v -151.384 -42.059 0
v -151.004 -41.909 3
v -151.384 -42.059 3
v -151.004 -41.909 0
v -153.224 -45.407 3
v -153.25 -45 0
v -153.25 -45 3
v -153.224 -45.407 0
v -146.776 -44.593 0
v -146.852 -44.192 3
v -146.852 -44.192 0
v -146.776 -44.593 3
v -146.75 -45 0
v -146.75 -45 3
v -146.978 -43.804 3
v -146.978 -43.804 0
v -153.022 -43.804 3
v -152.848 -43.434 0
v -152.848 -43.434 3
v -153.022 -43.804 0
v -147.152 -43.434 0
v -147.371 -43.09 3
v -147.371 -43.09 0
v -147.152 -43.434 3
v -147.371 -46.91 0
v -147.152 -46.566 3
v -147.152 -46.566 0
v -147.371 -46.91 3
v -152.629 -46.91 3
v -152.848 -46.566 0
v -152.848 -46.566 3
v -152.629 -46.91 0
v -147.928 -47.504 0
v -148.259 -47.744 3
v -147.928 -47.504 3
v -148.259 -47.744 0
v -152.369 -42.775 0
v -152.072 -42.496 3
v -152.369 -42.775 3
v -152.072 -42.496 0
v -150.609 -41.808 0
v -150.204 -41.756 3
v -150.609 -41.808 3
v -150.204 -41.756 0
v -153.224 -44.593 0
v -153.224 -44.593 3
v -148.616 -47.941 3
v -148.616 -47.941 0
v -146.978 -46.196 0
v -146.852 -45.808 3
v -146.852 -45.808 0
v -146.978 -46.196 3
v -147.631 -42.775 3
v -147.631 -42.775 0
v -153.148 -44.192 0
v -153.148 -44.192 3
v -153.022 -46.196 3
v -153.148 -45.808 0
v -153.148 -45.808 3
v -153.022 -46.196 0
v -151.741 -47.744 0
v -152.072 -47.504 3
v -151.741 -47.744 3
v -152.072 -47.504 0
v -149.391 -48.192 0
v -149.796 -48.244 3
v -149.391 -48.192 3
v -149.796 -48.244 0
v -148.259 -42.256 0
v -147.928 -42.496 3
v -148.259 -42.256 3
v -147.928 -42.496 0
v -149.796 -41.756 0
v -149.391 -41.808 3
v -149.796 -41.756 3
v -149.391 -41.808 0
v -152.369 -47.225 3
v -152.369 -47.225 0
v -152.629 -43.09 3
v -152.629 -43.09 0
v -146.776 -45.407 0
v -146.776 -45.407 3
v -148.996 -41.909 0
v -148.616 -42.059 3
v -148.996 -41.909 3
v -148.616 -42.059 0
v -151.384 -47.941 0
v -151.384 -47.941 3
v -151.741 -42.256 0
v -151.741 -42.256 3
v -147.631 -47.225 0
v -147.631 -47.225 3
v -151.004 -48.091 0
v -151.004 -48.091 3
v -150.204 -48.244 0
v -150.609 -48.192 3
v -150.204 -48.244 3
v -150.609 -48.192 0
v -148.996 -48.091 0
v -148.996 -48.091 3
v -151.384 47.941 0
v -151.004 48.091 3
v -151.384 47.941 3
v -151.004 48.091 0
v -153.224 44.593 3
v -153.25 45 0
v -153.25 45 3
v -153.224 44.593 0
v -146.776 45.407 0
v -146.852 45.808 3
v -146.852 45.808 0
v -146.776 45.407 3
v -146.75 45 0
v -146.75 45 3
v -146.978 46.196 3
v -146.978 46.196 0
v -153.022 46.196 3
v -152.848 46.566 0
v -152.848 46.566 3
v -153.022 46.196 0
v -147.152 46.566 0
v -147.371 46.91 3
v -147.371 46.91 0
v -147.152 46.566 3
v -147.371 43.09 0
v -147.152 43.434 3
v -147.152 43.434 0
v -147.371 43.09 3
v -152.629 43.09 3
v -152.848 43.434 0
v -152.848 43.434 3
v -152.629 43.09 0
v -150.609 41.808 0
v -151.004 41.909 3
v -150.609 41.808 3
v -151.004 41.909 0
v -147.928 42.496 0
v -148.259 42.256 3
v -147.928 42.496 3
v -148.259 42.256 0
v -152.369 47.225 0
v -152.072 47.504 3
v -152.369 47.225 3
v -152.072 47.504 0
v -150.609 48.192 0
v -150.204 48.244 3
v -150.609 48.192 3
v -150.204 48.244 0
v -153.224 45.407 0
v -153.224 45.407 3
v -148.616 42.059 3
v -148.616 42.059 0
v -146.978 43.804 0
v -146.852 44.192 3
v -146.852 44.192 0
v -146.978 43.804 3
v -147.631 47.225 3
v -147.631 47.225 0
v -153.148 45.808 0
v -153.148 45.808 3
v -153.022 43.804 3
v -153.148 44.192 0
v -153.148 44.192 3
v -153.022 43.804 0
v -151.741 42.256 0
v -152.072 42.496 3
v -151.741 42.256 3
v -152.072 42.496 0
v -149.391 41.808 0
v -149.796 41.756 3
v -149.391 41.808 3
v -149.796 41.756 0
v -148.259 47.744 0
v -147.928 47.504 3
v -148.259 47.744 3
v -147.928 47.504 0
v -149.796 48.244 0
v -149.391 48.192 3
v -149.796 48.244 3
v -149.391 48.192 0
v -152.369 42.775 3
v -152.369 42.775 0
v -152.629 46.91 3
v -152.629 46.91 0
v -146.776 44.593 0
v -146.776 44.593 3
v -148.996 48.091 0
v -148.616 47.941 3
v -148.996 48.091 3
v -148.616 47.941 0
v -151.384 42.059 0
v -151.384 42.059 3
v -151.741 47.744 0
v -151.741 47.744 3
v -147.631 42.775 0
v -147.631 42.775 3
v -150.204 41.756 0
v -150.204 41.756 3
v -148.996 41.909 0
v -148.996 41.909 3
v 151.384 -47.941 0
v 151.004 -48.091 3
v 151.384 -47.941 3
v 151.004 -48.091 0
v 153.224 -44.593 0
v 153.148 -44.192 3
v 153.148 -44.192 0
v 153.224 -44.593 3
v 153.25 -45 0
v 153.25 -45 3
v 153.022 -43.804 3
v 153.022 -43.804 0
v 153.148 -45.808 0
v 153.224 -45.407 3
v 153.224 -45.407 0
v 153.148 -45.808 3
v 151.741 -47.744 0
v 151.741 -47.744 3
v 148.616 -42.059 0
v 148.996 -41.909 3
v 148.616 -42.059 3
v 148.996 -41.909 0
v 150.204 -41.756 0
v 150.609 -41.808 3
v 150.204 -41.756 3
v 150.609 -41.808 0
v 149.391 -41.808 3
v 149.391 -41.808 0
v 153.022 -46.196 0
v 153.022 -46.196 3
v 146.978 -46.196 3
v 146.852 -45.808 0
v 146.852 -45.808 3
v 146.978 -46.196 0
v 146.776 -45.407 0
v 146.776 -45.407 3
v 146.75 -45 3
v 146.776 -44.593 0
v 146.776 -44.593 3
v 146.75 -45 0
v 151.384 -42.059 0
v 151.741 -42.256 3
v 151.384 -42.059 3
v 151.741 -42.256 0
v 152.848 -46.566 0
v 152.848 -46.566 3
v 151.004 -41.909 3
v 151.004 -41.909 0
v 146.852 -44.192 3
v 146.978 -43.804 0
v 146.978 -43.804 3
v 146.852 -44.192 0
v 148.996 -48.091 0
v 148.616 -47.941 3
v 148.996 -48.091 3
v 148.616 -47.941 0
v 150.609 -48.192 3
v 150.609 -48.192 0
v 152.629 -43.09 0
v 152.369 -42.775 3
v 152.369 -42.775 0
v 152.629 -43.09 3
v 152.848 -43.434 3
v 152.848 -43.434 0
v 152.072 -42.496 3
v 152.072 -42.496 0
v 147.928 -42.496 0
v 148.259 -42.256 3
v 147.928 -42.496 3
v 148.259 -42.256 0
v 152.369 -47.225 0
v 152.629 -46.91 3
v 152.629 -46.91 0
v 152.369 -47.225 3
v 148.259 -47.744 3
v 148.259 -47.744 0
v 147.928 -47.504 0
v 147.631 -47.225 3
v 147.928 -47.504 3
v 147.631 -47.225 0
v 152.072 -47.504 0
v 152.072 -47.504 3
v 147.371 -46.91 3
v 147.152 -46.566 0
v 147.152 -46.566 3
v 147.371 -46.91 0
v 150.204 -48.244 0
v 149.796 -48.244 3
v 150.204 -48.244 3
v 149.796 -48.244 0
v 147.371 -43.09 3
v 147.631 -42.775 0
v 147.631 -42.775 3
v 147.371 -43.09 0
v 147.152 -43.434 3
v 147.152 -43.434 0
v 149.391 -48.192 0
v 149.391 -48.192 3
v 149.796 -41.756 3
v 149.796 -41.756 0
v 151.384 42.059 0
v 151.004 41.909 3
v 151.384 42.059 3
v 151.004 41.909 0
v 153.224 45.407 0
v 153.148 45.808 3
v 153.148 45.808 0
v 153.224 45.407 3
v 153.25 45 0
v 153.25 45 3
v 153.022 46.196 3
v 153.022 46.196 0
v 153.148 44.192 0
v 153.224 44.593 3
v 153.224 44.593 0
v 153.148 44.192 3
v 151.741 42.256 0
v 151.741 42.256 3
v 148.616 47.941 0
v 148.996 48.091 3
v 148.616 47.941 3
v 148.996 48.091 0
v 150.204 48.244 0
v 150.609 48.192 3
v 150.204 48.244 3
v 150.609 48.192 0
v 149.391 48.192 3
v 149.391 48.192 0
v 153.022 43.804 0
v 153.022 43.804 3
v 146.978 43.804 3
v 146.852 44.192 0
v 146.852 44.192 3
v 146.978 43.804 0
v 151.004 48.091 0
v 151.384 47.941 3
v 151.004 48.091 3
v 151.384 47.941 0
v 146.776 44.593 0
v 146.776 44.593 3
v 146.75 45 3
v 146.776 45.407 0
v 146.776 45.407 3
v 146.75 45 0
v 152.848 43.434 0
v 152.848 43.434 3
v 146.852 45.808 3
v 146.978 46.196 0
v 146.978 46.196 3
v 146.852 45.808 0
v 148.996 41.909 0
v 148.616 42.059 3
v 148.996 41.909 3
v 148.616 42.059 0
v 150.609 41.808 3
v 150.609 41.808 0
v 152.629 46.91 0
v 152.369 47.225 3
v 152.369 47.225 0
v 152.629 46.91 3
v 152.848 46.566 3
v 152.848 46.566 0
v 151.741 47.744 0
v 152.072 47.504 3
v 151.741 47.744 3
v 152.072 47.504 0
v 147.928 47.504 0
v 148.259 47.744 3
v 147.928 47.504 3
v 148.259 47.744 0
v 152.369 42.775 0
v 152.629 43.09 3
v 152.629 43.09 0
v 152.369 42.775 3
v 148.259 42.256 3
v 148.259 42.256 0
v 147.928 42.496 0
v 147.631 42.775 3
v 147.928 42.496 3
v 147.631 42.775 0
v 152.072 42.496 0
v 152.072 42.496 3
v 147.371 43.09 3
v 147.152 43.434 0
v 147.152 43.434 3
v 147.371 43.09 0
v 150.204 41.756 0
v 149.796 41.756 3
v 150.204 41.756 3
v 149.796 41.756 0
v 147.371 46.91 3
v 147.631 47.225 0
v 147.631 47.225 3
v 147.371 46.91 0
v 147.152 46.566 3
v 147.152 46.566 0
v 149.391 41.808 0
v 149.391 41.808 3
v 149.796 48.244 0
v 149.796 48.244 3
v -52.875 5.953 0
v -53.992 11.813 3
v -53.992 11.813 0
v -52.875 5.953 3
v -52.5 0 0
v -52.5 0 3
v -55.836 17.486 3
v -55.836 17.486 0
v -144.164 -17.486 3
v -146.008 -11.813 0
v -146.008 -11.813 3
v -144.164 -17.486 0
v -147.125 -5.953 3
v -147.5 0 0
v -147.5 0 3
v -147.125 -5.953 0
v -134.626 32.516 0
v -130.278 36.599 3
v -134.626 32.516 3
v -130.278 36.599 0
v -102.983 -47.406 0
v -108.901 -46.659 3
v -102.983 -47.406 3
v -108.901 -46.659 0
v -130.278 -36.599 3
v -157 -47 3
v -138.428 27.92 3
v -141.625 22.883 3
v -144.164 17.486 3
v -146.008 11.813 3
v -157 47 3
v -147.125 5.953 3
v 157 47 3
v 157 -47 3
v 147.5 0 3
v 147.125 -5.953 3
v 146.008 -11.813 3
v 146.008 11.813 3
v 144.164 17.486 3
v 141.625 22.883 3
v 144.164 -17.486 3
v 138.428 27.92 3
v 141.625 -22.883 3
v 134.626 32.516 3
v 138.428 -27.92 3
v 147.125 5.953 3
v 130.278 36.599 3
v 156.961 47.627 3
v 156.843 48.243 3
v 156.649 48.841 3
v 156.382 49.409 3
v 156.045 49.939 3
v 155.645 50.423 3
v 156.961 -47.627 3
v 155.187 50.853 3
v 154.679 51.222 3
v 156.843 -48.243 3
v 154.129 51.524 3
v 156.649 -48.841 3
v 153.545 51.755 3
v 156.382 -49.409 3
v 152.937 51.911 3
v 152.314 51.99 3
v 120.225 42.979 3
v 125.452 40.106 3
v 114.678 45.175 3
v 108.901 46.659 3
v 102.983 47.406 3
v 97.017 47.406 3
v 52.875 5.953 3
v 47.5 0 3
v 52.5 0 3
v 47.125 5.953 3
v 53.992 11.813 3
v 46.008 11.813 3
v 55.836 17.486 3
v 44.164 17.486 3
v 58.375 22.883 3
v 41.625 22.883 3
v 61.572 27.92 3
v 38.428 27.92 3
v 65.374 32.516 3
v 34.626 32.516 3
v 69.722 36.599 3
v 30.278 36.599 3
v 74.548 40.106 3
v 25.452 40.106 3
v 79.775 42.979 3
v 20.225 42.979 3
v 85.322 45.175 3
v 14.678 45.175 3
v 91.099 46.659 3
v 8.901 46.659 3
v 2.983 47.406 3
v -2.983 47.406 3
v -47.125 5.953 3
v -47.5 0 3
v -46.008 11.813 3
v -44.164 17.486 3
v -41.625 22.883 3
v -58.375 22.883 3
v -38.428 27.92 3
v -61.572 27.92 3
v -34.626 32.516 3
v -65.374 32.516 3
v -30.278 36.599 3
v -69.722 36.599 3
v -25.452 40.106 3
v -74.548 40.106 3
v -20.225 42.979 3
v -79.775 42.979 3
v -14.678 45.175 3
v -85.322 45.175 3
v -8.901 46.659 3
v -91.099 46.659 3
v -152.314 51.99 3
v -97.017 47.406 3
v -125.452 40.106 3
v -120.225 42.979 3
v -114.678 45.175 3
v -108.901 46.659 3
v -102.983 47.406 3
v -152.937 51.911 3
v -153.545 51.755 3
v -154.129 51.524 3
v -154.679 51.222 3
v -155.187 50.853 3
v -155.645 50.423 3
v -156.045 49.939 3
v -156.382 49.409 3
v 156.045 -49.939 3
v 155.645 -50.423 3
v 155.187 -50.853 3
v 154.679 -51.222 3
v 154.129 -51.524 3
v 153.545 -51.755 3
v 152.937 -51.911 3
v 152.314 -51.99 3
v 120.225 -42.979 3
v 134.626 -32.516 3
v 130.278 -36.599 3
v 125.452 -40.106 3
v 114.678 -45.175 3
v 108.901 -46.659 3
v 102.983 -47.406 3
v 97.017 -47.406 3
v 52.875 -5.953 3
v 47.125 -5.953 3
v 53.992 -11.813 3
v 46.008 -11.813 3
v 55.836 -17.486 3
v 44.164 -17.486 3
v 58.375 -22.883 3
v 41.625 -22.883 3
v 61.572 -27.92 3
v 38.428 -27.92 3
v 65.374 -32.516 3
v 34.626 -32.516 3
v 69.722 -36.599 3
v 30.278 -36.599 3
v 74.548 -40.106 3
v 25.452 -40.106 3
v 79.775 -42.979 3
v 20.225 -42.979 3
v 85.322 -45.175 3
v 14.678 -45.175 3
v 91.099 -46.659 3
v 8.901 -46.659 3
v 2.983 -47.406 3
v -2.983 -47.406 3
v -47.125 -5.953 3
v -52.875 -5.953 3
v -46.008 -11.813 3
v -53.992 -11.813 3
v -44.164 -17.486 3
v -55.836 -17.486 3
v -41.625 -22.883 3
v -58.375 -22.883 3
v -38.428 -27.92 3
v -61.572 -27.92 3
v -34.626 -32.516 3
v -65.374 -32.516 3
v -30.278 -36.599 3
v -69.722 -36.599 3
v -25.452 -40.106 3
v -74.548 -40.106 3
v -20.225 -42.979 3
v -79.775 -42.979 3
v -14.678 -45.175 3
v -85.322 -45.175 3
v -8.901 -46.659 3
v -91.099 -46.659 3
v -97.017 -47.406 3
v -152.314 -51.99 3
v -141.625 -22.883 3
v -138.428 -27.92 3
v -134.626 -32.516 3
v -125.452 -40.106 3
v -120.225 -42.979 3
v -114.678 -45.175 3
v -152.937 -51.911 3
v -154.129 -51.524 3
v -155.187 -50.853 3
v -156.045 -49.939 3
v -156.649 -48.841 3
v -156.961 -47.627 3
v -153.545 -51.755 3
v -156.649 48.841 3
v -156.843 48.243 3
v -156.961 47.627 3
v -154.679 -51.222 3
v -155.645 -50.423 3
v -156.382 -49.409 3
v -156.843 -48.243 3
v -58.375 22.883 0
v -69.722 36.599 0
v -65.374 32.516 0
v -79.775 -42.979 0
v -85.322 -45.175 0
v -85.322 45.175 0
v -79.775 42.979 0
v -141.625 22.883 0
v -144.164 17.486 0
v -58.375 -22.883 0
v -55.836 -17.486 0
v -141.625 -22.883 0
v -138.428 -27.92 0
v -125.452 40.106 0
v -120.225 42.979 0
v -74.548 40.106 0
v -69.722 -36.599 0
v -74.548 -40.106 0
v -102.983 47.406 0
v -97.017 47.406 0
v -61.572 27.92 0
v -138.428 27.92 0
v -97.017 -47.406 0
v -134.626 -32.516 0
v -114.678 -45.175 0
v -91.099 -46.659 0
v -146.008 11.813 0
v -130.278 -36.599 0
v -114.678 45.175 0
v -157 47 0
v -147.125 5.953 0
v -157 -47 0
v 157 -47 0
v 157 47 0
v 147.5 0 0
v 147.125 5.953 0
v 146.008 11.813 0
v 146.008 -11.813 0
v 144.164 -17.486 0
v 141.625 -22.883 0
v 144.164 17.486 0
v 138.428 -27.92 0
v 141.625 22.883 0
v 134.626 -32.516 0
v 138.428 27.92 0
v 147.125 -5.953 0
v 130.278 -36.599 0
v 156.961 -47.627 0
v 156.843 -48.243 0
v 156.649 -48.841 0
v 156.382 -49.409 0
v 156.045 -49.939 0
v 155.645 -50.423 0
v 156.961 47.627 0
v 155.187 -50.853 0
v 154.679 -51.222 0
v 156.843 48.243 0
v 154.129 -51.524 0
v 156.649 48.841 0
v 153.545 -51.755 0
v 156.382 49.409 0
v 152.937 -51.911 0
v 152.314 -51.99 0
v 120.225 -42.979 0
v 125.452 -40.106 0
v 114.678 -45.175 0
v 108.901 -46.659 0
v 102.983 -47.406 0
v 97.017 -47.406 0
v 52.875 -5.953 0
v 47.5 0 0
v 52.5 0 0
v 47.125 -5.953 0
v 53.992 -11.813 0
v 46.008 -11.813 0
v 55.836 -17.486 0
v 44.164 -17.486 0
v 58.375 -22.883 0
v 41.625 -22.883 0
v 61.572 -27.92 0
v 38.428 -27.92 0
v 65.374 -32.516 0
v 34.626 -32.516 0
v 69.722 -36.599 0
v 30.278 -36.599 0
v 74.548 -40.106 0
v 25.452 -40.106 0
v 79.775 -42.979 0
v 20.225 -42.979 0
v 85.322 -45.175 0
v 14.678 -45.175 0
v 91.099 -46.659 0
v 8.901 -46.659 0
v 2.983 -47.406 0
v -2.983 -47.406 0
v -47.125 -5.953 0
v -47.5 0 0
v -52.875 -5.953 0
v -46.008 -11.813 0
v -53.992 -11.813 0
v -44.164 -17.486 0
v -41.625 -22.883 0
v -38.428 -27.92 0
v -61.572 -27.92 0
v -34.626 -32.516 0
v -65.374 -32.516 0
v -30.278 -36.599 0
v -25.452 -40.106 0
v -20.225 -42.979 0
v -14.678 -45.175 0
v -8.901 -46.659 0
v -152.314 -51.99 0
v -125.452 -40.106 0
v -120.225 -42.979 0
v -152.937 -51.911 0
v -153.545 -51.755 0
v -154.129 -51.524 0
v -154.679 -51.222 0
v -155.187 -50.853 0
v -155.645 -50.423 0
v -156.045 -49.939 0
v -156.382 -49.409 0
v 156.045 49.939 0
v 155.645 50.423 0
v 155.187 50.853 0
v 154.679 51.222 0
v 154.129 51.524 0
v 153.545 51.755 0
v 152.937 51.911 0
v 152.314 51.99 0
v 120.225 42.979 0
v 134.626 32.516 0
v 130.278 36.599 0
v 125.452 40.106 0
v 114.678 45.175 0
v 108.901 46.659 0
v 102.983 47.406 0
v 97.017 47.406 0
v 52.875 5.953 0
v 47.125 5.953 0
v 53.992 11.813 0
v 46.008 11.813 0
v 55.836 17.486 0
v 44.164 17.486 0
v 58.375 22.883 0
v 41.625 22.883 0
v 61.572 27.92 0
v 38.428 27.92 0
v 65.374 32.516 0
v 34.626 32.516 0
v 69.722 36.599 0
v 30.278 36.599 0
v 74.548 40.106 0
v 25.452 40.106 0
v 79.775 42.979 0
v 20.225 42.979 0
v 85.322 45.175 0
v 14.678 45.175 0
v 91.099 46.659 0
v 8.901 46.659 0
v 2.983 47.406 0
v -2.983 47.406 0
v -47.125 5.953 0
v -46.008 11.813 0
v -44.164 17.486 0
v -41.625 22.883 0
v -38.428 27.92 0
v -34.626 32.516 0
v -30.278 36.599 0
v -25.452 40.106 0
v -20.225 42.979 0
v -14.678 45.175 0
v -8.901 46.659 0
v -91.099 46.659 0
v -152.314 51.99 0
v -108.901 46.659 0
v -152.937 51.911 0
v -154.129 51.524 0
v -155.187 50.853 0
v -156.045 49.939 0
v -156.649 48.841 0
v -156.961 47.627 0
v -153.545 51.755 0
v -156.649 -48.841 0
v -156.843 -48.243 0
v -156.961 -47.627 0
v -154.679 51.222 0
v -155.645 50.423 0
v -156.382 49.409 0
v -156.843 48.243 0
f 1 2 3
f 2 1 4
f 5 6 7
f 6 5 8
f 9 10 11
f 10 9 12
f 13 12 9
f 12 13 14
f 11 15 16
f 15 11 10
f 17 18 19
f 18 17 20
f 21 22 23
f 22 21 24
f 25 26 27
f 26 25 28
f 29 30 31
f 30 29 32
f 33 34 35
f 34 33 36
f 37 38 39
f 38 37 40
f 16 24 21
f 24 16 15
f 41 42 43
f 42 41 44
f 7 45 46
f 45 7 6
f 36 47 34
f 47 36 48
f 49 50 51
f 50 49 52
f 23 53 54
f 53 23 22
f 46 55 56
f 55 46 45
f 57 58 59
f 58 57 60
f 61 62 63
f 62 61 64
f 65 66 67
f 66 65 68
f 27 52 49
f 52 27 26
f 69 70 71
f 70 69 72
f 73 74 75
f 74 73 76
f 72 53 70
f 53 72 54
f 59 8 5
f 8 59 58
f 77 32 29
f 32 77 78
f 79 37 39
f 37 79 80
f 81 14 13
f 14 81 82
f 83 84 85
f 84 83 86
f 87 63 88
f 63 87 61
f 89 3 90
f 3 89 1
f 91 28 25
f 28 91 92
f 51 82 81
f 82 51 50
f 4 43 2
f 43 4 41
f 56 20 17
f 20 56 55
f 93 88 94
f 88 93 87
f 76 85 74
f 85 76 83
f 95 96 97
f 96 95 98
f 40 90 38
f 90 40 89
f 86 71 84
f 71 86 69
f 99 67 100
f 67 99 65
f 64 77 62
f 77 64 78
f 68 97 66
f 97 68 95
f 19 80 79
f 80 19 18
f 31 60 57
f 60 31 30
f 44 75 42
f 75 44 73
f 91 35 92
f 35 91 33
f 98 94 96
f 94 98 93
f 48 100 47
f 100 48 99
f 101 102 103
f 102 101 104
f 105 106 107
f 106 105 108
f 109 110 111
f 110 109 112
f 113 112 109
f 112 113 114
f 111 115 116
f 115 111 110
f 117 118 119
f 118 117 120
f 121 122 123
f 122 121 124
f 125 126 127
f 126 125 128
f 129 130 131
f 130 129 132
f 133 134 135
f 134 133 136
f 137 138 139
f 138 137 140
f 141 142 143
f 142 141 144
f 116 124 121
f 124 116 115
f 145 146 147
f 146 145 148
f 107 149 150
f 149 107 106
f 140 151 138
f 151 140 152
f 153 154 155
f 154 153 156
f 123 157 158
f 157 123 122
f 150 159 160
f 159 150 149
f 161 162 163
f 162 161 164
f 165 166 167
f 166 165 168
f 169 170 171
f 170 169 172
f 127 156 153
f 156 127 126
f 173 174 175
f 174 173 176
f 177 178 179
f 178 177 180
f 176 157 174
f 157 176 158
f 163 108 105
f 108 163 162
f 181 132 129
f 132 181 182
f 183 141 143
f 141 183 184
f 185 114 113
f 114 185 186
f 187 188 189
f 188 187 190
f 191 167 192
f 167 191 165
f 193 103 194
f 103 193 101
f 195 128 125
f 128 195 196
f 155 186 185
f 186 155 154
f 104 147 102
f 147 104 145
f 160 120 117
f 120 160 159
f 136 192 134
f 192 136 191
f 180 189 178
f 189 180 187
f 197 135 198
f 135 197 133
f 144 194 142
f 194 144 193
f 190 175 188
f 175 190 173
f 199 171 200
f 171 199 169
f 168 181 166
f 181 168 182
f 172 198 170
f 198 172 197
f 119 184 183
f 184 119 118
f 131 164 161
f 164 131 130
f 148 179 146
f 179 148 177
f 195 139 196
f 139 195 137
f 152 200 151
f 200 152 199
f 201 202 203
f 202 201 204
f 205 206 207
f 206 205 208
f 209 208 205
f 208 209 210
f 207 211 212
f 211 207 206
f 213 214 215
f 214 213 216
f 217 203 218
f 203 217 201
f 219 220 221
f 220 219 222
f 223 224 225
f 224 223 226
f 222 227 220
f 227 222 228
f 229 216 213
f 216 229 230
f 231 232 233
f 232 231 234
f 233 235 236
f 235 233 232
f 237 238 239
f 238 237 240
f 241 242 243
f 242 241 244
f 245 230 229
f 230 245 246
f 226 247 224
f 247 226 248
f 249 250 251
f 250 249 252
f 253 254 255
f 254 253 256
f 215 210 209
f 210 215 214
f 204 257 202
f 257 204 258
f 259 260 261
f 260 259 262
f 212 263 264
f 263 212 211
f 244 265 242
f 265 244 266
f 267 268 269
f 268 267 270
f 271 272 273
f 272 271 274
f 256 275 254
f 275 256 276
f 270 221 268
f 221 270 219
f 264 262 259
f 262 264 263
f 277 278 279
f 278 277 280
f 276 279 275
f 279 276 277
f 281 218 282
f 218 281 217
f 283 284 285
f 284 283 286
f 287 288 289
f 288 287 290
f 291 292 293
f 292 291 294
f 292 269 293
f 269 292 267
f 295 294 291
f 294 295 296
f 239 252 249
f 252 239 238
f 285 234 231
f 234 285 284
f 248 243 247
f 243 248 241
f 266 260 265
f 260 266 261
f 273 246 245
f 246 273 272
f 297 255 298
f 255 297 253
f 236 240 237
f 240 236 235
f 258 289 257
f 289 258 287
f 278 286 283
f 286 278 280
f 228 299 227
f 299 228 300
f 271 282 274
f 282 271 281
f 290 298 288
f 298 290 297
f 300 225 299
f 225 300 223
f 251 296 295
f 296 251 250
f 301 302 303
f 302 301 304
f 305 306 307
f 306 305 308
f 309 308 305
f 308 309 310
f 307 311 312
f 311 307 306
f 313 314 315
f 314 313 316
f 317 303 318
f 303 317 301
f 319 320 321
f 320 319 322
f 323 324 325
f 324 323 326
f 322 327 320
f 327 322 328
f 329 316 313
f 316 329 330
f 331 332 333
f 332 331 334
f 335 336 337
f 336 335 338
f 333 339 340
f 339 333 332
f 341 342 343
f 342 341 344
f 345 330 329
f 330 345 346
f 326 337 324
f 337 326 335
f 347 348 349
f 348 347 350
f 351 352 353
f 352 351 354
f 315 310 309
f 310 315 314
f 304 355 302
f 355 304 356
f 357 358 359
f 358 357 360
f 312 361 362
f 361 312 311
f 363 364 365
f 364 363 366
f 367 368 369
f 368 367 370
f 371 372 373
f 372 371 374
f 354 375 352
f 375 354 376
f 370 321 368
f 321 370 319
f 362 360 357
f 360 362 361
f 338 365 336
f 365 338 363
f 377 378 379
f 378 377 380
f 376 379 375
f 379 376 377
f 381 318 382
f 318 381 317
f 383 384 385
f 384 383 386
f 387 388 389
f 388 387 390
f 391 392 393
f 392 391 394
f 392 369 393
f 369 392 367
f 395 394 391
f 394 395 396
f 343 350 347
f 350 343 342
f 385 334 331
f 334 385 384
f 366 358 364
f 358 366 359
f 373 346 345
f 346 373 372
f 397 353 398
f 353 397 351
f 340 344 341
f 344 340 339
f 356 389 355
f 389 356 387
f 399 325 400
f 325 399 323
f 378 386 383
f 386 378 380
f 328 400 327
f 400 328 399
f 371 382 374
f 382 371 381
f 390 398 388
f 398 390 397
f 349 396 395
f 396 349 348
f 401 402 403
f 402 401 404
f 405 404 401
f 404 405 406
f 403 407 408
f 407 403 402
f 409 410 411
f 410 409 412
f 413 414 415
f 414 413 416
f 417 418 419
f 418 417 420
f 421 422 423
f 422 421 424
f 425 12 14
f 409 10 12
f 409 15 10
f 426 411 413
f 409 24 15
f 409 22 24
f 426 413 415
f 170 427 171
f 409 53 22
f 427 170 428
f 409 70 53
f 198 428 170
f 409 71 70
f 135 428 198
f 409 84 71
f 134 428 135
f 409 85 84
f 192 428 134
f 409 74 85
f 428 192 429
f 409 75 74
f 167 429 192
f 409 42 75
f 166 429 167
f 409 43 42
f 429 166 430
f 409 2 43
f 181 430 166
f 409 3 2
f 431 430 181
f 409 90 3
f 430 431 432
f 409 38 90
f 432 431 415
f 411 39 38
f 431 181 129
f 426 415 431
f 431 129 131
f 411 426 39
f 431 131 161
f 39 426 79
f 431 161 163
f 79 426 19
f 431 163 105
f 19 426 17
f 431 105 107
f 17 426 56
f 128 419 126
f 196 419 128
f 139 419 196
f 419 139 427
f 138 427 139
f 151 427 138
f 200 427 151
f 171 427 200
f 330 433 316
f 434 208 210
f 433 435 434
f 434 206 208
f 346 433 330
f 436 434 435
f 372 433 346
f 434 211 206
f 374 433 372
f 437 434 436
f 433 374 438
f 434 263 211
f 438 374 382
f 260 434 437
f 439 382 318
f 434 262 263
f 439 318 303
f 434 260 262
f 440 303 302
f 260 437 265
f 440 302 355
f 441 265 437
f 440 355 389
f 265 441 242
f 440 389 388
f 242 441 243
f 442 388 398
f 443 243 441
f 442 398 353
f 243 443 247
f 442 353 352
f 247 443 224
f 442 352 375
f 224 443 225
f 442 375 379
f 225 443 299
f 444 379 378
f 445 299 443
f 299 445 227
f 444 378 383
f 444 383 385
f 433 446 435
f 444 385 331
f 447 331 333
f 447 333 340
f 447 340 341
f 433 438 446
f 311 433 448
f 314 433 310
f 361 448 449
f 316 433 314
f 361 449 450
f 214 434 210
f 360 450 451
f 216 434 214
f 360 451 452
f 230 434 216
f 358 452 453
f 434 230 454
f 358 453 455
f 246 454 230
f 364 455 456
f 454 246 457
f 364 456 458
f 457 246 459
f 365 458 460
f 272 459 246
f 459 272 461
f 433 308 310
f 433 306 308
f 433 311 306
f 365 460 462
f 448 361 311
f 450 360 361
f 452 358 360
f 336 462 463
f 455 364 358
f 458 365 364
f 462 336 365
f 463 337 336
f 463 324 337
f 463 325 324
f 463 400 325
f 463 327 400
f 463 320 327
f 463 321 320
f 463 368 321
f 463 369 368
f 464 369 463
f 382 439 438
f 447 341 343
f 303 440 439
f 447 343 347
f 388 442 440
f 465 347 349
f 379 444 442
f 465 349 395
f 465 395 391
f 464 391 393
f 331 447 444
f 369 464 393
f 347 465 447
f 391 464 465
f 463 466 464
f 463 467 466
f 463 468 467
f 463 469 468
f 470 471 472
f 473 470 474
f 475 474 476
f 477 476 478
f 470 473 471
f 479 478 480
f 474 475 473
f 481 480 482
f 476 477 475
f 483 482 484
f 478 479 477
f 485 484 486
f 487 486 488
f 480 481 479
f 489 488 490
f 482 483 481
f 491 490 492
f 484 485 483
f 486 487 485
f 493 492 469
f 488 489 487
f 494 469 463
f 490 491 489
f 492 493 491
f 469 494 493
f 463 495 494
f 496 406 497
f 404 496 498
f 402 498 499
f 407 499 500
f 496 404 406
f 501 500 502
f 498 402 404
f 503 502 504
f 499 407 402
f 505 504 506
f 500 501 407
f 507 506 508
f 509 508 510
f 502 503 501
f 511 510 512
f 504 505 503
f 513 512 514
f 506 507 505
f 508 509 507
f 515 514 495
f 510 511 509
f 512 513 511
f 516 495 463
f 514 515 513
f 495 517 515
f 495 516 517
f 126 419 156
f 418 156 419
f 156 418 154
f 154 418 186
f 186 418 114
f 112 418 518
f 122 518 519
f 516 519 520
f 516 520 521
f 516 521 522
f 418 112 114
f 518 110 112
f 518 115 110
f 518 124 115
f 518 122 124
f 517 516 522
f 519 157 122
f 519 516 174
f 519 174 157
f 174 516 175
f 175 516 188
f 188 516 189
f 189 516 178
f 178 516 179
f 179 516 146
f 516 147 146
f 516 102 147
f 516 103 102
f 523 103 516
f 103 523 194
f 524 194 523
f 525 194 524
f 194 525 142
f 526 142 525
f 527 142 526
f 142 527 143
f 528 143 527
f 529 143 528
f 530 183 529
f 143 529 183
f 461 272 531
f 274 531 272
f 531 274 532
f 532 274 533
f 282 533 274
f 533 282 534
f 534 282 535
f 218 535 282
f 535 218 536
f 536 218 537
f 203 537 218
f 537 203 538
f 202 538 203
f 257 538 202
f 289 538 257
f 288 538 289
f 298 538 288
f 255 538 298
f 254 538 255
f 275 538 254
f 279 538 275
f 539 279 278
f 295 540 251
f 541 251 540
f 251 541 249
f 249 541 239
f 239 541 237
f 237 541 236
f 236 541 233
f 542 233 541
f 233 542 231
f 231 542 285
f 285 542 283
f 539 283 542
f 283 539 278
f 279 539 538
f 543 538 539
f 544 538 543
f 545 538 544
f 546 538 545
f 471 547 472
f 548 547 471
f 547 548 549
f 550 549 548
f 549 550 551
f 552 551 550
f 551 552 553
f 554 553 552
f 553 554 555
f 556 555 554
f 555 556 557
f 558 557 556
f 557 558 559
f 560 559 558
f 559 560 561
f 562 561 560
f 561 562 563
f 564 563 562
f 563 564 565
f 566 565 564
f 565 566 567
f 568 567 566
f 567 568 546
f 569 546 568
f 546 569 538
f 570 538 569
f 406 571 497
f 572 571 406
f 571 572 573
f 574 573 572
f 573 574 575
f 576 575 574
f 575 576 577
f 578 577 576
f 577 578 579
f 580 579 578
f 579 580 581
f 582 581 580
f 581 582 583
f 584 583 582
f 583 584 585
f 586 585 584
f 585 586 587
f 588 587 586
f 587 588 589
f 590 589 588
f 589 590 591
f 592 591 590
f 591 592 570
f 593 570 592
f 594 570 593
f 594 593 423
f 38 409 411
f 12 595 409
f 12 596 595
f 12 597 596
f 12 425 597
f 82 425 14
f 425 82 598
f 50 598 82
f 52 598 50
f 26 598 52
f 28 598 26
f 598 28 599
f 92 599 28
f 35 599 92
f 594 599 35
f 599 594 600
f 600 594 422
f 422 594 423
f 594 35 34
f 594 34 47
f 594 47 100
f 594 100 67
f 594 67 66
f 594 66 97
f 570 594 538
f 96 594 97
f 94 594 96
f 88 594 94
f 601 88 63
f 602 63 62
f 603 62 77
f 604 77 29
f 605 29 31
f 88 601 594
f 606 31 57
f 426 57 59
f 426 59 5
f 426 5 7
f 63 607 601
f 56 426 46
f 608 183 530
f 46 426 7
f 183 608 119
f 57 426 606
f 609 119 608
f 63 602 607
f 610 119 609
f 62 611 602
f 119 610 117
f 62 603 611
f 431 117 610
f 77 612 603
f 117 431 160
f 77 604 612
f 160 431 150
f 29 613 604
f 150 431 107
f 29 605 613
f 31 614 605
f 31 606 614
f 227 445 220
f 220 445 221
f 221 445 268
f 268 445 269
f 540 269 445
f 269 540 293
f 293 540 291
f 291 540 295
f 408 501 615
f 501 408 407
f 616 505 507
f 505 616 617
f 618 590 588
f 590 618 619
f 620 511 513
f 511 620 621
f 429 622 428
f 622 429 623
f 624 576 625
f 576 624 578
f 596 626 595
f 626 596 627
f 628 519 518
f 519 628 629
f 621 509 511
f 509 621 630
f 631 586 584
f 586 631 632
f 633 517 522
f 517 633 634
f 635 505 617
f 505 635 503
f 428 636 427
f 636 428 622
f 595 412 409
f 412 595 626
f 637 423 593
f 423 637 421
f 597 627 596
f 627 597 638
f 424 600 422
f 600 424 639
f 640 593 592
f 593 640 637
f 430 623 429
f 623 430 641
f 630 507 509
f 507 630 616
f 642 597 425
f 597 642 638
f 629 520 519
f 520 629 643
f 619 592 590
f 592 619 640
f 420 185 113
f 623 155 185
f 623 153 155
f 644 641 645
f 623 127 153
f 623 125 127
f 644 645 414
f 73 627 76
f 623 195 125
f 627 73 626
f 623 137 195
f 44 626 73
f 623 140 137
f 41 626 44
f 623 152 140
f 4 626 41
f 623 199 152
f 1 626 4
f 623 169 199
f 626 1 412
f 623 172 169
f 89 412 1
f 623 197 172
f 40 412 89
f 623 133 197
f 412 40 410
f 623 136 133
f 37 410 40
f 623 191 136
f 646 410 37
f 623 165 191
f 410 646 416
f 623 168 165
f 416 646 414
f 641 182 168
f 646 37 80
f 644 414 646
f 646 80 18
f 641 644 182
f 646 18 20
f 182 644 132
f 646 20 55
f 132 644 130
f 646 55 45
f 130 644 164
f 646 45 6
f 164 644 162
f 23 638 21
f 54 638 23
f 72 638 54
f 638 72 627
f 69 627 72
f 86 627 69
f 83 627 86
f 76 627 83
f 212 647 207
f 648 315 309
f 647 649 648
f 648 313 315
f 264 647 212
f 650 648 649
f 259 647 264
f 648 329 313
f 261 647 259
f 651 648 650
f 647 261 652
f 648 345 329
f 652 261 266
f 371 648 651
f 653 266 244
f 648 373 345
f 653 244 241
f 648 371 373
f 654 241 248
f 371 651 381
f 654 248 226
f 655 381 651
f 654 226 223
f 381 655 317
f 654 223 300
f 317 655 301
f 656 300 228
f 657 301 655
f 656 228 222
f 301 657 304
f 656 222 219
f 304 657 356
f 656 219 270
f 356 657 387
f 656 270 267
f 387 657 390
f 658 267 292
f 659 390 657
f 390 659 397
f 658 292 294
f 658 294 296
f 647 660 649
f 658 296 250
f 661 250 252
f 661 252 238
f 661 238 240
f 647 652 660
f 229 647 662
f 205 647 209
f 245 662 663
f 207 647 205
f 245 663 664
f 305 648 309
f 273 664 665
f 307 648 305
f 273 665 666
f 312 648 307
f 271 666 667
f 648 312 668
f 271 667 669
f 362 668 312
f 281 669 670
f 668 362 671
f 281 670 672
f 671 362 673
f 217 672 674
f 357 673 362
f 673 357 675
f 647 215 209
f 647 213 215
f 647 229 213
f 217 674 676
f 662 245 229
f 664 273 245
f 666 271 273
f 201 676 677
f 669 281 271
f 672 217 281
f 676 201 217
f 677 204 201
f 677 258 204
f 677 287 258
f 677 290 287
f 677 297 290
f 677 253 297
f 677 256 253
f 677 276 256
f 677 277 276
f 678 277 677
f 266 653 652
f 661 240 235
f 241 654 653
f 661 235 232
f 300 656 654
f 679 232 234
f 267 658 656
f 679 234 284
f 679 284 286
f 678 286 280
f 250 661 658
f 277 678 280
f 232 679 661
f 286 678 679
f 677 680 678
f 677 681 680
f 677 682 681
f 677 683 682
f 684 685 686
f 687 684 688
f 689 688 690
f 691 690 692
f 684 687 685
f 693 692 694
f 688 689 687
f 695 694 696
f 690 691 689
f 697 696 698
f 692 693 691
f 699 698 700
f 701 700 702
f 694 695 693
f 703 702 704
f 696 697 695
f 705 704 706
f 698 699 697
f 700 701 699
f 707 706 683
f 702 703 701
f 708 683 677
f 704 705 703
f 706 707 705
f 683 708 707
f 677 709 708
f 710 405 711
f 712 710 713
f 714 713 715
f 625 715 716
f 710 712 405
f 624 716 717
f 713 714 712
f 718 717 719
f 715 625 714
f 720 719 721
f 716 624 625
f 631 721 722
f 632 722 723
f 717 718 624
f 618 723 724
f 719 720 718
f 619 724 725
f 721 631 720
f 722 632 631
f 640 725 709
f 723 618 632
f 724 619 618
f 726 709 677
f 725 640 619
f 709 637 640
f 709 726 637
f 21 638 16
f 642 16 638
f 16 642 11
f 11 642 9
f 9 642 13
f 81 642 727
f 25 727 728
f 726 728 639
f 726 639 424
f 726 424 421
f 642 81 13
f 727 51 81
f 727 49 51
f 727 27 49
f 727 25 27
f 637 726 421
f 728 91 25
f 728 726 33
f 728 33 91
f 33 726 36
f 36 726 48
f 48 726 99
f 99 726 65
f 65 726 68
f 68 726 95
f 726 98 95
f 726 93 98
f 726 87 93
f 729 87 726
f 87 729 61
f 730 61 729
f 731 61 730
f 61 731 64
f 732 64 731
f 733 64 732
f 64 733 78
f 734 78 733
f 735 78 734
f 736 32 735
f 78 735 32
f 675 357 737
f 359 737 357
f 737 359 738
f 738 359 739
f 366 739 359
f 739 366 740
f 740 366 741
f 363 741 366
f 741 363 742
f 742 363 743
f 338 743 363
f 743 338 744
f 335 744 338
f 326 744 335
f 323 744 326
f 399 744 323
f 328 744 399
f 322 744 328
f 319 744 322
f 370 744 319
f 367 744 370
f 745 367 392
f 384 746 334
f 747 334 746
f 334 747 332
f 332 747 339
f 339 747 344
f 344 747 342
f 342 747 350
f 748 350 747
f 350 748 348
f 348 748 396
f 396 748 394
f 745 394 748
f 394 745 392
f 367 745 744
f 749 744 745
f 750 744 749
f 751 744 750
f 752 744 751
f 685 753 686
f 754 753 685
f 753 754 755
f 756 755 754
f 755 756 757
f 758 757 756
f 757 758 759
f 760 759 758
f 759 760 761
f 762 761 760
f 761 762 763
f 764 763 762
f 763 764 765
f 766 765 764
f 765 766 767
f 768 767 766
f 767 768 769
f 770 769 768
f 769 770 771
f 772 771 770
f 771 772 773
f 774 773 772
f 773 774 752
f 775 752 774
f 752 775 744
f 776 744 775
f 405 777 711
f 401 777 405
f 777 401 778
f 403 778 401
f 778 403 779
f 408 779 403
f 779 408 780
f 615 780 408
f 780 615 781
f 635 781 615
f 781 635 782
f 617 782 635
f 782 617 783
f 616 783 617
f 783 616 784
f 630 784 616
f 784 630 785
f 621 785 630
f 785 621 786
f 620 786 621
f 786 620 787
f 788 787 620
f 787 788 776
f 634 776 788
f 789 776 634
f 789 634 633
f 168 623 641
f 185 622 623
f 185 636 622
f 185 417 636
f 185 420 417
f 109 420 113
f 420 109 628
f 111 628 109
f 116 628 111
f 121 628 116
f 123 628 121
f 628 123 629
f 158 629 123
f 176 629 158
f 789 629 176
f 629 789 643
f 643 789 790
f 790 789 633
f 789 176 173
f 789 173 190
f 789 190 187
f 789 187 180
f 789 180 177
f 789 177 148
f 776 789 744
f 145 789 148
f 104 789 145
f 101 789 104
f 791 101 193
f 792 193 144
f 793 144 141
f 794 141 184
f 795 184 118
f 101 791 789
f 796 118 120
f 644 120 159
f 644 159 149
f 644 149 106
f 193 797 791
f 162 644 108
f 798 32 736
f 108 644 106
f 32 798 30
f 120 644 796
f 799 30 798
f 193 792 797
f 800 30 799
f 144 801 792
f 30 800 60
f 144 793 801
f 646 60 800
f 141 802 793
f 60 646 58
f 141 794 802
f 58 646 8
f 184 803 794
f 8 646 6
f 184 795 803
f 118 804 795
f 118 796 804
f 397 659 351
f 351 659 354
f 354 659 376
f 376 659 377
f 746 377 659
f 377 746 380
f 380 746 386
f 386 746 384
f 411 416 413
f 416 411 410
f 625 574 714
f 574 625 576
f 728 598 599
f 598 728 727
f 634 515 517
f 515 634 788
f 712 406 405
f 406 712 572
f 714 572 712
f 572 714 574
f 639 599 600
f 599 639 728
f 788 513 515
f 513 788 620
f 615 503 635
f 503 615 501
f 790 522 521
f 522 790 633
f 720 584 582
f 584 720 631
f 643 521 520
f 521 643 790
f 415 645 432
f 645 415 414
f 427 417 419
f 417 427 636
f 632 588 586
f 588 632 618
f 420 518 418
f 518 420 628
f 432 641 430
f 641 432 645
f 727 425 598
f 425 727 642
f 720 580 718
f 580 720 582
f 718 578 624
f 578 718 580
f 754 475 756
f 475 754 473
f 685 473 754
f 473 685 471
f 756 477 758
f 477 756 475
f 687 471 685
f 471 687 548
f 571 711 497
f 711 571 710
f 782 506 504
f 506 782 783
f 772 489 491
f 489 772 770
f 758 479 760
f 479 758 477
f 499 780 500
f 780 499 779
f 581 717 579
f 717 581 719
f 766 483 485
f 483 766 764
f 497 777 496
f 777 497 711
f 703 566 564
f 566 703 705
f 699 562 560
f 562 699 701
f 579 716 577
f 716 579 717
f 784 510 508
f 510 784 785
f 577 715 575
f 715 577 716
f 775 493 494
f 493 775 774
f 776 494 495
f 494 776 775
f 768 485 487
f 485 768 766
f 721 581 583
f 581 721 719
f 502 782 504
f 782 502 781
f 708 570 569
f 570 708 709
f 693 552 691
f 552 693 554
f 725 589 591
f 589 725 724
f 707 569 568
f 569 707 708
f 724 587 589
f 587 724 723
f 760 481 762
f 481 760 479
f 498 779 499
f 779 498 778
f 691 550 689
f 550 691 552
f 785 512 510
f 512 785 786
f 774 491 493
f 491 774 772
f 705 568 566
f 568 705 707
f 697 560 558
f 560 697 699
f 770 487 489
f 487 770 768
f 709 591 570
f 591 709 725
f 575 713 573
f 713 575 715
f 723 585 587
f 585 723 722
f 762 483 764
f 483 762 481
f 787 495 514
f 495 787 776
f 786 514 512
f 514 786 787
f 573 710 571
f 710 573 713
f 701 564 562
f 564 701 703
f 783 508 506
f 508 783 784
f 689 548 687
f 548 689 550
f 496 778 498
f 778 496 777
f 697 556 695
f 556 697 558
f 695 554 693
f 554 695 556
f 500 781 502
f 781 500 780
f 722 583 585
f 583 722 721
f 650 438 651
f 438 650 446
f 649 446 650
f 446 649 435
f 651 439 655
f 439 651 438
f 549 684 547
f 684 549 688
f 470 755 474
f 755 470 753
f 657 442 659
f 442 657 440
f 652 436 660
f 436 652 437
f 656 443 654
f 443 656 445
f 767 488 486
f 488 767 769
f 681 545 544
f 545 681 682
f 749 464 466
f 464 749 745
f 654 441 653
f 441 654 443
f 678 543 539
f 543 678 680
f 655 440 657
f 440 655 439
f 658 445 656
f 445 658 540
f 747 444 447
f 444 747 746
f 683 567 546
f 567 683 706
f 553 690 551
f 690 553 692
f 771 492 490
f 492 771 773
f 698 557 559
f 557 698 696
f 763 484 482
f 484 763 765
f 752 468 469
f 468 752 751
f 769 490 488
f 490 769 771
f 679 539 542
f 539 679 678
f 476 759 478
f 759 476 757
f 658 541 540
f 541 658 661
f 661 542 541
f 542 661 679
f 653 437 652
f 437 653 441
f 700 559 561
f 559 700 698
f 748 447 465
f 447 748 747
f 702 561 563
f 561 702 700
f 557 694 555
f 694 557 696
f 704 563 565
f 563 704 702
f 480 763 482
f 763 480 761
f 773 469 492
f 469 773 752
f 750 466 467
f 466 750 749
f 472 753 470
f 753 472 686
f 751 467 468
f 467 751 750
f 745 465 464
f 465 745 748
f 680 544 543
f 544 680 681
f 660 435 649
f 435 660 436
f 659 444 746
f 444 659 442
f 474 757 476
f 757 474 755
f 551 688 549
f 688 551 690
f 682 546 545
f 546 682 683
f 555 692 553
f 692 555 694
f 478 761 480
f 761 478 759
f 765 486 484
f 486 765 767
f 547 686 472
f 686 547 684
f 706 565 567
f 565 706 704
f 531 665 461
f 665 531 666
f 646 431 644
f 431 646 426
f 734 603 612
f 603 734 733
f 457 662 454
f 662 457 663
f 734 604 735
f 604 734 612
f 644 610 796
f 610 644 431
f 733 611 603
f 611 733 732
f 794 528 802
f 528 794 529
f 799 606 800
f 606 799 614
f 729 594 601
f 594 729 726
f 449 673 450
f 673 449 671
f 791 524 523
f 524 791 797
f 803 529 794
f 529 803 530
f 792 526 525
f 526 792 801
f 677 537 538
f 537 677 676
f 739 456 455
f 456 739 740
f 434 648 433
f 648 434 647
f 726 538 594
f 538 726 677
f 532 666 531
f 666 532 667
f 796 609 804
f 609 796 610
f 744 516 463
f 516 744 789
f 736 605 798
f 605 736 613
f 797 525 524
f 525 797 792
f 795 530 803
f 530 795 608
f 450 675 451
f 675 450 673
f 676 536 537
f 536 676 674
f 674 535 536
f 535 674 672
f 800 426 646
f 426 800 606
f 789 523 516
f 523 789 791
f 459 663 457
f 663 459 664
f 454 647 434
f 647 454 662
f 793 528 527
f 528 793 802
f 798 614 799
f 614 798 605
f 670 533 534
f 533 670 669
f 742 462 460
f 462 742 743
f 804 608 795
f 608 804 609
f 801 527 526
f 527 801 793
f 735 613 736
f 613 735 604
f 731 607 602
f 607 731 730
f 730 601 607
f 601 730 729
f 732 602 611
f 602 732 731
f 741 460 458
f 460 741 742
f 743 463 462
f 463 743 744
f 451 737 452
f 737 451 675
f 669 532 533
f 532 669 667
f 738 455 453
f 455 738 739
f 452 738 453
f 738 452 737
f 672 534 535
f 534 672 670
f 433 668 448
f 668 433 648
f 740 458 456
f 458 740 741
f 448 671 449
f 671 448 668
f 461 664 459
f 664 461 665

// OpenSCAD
$fn = 50;


difference() {
	union() {
		hull() {
			translate(v = [-152.0000000000, 47.0000000000, 0]) {
				cylinder(h = 3, r = 5);
			}
			translate(v = [152.0000000000, 47.0000000000, 0]) {
				cylinder(h = 3, r = 5);
			}
			translate(v = [-152.0000000000, -47.0000000000, 0]) {
				cylinder(h = 3, r = 5);
			}
			translate(v = [152.0000000000, -47.0000000000, 0]) {
				cylinder(h = 3, r = 5);
			}
		}
	}
	union() {
		#translate(v = [-150.0000000000, -45.0000000000, -100.0000000000]) {
			cylinder(h = 200, r = 3.2500000000);
		}
		#translate(v = [-150.0000000000, 45.0000000000, -100.0000000000]) {
			cylinder(h = 200, r = 3.2500000000);
		}
		#translate(v = [150.0000000000, -45.0000000000, -100.0000000000]) {
			cylinder(h = 200, r = 3.2500000000);
		}
		#translate(v = [150.0000000000, 45.0000000000, -100.0000000000]) {
			cylinder(h = 200, r = 3.2500000000);
		}
		#translate(v = [-100.0000000000, 0, 0]) {
			cylinder(h = 3, r = 47.5000000000);
		}
		#cylinder(h = 3, r = 47.5000000000);
		#translate(v = [100.0000000000, 0, 0]) {
			cylinder(h = 3, r = 47.5000000000);
		}
	}
}
